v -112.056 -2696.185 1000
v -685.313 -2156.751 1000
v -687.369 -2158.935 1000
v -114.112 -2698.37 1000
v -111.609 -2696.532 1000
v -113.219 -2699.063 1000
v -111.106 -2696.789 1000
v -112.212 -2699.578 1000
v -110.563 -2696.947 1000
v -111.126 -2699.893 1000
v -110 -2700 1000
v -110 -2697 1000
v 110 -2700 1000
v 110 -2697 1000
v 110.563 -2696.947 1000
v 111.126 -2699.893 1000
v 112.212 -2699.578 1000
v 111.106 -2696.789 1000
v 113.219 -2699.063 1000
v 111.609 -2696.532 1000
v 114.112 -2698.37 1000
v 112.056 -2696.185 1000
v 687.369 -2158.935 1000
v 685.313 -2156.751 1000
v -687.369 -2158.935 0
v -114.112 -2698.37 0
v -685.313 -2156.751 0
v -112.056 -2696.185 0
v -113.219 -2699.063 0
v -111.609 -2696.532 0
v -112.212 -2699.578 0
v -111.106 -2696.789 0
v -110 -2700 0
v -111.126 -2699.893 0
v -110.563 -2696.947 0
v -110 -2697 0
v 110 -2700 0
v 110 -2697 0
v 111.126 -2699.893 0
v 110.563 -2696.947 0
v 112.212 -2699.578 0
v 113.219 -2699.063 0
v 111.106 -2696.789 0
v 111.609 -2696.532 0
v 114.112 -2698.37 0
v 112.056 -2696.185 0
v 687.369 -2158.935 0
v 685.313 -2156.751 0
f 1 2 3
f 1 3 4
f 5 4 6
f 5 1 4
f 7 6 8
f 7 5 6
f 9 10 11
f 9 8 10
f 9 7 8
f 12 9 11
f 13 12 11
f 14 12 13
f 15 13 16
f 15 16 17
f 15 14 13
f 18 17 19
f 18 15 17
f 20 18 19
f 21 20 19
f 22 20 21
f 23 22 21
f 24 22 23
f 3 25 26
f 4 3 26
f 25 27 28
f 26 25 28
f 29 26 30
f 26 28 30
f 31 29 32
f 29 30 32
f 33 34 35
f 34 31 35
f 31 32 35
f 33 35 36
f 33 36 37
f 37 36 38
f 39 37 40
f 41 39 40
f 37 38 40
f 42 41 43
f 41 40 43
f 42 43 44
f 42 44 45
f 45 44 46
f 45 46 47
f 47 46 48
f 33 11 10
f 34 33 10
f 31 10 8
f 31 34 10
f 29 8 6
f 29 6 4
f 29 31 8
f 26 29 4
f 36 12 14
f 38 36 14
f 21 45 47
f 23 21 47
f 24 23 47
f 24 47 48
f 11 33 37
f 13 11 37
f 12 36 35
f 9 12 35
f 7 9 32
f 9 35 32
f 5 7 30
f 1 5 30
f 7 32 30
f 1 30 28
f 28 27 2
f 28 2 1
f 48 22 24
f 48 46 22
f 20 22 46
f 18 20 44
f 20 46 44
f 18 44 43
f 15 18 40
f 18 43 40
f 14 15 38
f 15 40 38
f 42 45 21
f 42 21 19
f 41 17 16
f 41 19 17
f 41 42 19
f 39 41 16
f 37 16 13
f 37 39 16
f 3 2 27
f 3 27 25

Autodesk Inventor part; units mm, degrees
ref_plane "YZ Plane" through (0, 0, 0) normal (1, 0, 0) x (0, 1, 0)
ref_plane "XZ Plane" through (0, 0, 0) normal (0, 1, 0) x (-1, 0, 0)
ref_plane "XY Plane" through (0, 0, 0) normal (0, 0, 1) x (1, 0, 0)
sketch "Sketch1" plane through (0, 0, 0) normal (0, 0, 1) x (1, 0, 0)
  line L0 (-750, 0) -> (750, 0) construction
  line L1 (750, 0) -> (750, -2700) construction
  line L2 (750, -2700) -> (-750, -2700) construction
  line L3 (-750, -2700) -> (-750, 0) construction
  line L4 (800, 50) -> (-800, 50) construction
  line L5 (-800, 50) -> (-800, -2750) construction
  line L6 (-800, -2750) -> (800, -2750) construction
  line L7 (800, -2750) -> (800, 50) construction
  line L8 (-850, 100) -> (850, 100) construction
  line L9 (850, 100) -> (850, -2800) construction
  line L10 (850, -2800) -> (-850, -2800) construction
  line L11 (-850, -2800) -> (-850, 100) construction
  arc A0 (750, 0) -> (745.2706, 0.6314) centre (0, -5600) ccw construction
  line L12 (-750, -2100) -> (750, -2100) construction
  line L13 (114.1118, -2698.3696) -> (687.3692, -2158.9354)
  arc A1 (750, -2100) -> (768.2917, -213.4901) centre (-10250, -1050) ccw construction
  line L14 (750, 0) -> (749.6018, -2.9735) construction
  arc A2 (750, -3.0268) -> (0, 47) centre (-0.2, -5603) ccw construction
  line L15 (750, 0) -> (747.0136, -0.2851) construction
  arc A3 (767.1641, -238.6409) -> (747.4657, -5.0326) centre (-10252.9895, -1050.2527) ccw construction
  arc A4 (750.4522, -4.7486) -> (745.2706, 0.6314) centre (744.4791, -5.3162) ccw construction
  arc A5 (747.4657, -5.0326) -> (744.8748, -2.3426) centre (744.4792, -5.3164) ccw construction
  line L16 (750, -2100) -> (752.9864, -2100.2851) construction
  arc A6 (752.9864, -2100.2851) -> (771.2831, -213.263) centre (-10246.9891, -1050.0292) ccw construction
  line L17 (750, -2100) -> (752.0559, -2102.1848) construction
  line L18 (752.0559, -2102.1848) -> (752.0559, -2102.1848) construction
  arc A7 (749.1768, -2100.7746) -> (750.1074, -2098.8746) centre (747.1209, -2098.5898) ccw construction
  line L19 (0, -2697) -> (110, -2697) construction
  line L20 (112.0559, -2696.1848) -> (685.3133, -2156.7506) construction
  arc A8 (110, -2700) -> (114.1118, -2698.3696) centre (110, -2694) ccw
  arc A9 (110, -2697) -> (112.0559, -2696.1848) centre (110, -2694) ccw construction
  line L21 (685.3133, -2156.7506) -> (687.3692, -2158.9354) construction
  line L22 (752.0559, -2102.1848) -> (671.2185, -2178.2526) construction
  line L23 (671.2185, -2178.2526) -> (669.1626, -2176.0678) construction
  arc A10 (747.4657, -5.0326) -> (747.0136, -0.2851) centre (-10252.9895, -1050.2527) ccw construction
  arc A11 (745.2706, 0.6314) -> (0, 50) centre (0, -5600) ccw construction
  arc A12 (750.4522, -4.7486) -> (750, 0) centre (-10250, -1050) ccw construction
  line L24 (770.156, -238.4205) -> (767.1641, -238.6409) construction
  line L25 (768.2917, -213.4901) -> (771.2831, -213.263) construction
  arc A13 (768.2917, -213.4901) -> (750.4522, -4.7486) centre (-10250, -1050) ccw construction
  line L26 (0, 100) -> (0, 50) construction
  line L27 (0, -2700) -> (0, -2697) construction
  line L28 (0, 47) -> (0, 0) construction
  line L29 (0, 50) -> (0, 47) construction
  arc A14 (752.0559, -2102.1848) -> (752.9864, -2100.2851) centre (749.9983, -2099.9992) ccw construction
  line L30 (0, -2700) -> (110, -2700)
  line L31 (687.3692, -2158.9354) -> (750, -2100) construction
  point P0 (0, -2750)
  dimension "d19" = 1500
  dimension "d20" = 2700
  dimension "d21" = 2100
  dimension "d22" = 6
  dimension "d23" = 3
  dimension "d24" = 3
  dimension "d25" = 6
  dimension "d26" = 3
  dimension "d27" = 239.271
  dimension "d28" = 50
  dimension "d29" = 50
  dimension "d30" = 3
  dimension "d31" = 25
  dimension "d32" = 110
  dimension "d33" = 25
  dimension "d34" = 111
contour flange "Contour Flange1" sketch "Sketch1" thickness 3 bend radius 3 width 1000 along (0, 0, 1) mid plane no both sides no wall seen from (55, -2700, 0) lies toward (0, 1, 0) curves L30 A8 L13
bend "Bend1"
corner "Corner1"
mirror "Mirror1" about plane through (0, 0, 0) normal (1, 0, 0)
equation "\"d19\" = Бак_ширина_общая"
equation "\"d20\" = Бак_высота_общая"
equation "\"d21\" = Бак_высота_до_конуса"
equation "\"d22\" = Thickness + BendRadius"
equation "\"d23\" = Thickness"
equation "\"d24\" = Thickness"
equation "\"d25\" = Thickness + BendRadius"
equation "\"d26\" = Thickness"
equation "\"d27\" = Бак_спина_длина_фланцев"
equation "\"d30\" = d40"
equation "\"d31\" = Бак_нахлест_фланца"
equation "\"d32\" = 0.5 * Бак_брюхо_ширина_полки"
equation "\"d33\" = Бак_нахлест_фланца"
equation "\"d34\" = Бак_борт_длина_фланца"
equation "\"d7\" = Thickness"
equation "\"d8\" = BendReliefWidth"
equation "\"d9\" = BendReliefDepth"
equation "\"d10\" = MinimumRemnant"
equation "\"d11\" = TransitionRadius"
equation "\"d13\" = BendRadius"
equation "\"d15\" = CornerReliefSize"
equation "\"d16\" = GapSize"
equation "\"d17\" = JacobiRadiusSize"
equation "\"BendRadius\" = Thickness"
equation "\"BendReliefWidth\" = Thickness"
equation "\"BendReliefDepth\" = 0.5 * Thickness"
equation "\"CornerReliefSize\" = 4 * Thickness"
equation "\"MinimumRemnant\" = 2 * Thickness"
equation "\"TransitionRadius\" = BendRadius"
equation "\"JacobiRadiusSize\" = BendRadius"
equation "\"GapSize\" = Thickness"
equation "\"d38\" = d40 + d44"
equation "\"d39\" = d40"
equation "\"d44\" = d40"
equation "\"Бак_ширина_общая\" = 1500"
equation "\"Бак_высота_общая\" = 2700"
equation "\"Бак_высота_до_конуса\" = 2100"
equation "\"Thickness\" = 3"
equation "\"Бак_спина_длина_фланцев\" = 239.271"
equation "\"d40\" = 3"
equation "\"Бак_нахлест_фланца\" = 25"
equation "\"Бак_брюхо_ширина_полки\" = 220"
equation "\"Бак_борт_длина_фланца\" = 111"
properties part number "МОО 041 sheet брюхо основной" material "Stainless Steel"
